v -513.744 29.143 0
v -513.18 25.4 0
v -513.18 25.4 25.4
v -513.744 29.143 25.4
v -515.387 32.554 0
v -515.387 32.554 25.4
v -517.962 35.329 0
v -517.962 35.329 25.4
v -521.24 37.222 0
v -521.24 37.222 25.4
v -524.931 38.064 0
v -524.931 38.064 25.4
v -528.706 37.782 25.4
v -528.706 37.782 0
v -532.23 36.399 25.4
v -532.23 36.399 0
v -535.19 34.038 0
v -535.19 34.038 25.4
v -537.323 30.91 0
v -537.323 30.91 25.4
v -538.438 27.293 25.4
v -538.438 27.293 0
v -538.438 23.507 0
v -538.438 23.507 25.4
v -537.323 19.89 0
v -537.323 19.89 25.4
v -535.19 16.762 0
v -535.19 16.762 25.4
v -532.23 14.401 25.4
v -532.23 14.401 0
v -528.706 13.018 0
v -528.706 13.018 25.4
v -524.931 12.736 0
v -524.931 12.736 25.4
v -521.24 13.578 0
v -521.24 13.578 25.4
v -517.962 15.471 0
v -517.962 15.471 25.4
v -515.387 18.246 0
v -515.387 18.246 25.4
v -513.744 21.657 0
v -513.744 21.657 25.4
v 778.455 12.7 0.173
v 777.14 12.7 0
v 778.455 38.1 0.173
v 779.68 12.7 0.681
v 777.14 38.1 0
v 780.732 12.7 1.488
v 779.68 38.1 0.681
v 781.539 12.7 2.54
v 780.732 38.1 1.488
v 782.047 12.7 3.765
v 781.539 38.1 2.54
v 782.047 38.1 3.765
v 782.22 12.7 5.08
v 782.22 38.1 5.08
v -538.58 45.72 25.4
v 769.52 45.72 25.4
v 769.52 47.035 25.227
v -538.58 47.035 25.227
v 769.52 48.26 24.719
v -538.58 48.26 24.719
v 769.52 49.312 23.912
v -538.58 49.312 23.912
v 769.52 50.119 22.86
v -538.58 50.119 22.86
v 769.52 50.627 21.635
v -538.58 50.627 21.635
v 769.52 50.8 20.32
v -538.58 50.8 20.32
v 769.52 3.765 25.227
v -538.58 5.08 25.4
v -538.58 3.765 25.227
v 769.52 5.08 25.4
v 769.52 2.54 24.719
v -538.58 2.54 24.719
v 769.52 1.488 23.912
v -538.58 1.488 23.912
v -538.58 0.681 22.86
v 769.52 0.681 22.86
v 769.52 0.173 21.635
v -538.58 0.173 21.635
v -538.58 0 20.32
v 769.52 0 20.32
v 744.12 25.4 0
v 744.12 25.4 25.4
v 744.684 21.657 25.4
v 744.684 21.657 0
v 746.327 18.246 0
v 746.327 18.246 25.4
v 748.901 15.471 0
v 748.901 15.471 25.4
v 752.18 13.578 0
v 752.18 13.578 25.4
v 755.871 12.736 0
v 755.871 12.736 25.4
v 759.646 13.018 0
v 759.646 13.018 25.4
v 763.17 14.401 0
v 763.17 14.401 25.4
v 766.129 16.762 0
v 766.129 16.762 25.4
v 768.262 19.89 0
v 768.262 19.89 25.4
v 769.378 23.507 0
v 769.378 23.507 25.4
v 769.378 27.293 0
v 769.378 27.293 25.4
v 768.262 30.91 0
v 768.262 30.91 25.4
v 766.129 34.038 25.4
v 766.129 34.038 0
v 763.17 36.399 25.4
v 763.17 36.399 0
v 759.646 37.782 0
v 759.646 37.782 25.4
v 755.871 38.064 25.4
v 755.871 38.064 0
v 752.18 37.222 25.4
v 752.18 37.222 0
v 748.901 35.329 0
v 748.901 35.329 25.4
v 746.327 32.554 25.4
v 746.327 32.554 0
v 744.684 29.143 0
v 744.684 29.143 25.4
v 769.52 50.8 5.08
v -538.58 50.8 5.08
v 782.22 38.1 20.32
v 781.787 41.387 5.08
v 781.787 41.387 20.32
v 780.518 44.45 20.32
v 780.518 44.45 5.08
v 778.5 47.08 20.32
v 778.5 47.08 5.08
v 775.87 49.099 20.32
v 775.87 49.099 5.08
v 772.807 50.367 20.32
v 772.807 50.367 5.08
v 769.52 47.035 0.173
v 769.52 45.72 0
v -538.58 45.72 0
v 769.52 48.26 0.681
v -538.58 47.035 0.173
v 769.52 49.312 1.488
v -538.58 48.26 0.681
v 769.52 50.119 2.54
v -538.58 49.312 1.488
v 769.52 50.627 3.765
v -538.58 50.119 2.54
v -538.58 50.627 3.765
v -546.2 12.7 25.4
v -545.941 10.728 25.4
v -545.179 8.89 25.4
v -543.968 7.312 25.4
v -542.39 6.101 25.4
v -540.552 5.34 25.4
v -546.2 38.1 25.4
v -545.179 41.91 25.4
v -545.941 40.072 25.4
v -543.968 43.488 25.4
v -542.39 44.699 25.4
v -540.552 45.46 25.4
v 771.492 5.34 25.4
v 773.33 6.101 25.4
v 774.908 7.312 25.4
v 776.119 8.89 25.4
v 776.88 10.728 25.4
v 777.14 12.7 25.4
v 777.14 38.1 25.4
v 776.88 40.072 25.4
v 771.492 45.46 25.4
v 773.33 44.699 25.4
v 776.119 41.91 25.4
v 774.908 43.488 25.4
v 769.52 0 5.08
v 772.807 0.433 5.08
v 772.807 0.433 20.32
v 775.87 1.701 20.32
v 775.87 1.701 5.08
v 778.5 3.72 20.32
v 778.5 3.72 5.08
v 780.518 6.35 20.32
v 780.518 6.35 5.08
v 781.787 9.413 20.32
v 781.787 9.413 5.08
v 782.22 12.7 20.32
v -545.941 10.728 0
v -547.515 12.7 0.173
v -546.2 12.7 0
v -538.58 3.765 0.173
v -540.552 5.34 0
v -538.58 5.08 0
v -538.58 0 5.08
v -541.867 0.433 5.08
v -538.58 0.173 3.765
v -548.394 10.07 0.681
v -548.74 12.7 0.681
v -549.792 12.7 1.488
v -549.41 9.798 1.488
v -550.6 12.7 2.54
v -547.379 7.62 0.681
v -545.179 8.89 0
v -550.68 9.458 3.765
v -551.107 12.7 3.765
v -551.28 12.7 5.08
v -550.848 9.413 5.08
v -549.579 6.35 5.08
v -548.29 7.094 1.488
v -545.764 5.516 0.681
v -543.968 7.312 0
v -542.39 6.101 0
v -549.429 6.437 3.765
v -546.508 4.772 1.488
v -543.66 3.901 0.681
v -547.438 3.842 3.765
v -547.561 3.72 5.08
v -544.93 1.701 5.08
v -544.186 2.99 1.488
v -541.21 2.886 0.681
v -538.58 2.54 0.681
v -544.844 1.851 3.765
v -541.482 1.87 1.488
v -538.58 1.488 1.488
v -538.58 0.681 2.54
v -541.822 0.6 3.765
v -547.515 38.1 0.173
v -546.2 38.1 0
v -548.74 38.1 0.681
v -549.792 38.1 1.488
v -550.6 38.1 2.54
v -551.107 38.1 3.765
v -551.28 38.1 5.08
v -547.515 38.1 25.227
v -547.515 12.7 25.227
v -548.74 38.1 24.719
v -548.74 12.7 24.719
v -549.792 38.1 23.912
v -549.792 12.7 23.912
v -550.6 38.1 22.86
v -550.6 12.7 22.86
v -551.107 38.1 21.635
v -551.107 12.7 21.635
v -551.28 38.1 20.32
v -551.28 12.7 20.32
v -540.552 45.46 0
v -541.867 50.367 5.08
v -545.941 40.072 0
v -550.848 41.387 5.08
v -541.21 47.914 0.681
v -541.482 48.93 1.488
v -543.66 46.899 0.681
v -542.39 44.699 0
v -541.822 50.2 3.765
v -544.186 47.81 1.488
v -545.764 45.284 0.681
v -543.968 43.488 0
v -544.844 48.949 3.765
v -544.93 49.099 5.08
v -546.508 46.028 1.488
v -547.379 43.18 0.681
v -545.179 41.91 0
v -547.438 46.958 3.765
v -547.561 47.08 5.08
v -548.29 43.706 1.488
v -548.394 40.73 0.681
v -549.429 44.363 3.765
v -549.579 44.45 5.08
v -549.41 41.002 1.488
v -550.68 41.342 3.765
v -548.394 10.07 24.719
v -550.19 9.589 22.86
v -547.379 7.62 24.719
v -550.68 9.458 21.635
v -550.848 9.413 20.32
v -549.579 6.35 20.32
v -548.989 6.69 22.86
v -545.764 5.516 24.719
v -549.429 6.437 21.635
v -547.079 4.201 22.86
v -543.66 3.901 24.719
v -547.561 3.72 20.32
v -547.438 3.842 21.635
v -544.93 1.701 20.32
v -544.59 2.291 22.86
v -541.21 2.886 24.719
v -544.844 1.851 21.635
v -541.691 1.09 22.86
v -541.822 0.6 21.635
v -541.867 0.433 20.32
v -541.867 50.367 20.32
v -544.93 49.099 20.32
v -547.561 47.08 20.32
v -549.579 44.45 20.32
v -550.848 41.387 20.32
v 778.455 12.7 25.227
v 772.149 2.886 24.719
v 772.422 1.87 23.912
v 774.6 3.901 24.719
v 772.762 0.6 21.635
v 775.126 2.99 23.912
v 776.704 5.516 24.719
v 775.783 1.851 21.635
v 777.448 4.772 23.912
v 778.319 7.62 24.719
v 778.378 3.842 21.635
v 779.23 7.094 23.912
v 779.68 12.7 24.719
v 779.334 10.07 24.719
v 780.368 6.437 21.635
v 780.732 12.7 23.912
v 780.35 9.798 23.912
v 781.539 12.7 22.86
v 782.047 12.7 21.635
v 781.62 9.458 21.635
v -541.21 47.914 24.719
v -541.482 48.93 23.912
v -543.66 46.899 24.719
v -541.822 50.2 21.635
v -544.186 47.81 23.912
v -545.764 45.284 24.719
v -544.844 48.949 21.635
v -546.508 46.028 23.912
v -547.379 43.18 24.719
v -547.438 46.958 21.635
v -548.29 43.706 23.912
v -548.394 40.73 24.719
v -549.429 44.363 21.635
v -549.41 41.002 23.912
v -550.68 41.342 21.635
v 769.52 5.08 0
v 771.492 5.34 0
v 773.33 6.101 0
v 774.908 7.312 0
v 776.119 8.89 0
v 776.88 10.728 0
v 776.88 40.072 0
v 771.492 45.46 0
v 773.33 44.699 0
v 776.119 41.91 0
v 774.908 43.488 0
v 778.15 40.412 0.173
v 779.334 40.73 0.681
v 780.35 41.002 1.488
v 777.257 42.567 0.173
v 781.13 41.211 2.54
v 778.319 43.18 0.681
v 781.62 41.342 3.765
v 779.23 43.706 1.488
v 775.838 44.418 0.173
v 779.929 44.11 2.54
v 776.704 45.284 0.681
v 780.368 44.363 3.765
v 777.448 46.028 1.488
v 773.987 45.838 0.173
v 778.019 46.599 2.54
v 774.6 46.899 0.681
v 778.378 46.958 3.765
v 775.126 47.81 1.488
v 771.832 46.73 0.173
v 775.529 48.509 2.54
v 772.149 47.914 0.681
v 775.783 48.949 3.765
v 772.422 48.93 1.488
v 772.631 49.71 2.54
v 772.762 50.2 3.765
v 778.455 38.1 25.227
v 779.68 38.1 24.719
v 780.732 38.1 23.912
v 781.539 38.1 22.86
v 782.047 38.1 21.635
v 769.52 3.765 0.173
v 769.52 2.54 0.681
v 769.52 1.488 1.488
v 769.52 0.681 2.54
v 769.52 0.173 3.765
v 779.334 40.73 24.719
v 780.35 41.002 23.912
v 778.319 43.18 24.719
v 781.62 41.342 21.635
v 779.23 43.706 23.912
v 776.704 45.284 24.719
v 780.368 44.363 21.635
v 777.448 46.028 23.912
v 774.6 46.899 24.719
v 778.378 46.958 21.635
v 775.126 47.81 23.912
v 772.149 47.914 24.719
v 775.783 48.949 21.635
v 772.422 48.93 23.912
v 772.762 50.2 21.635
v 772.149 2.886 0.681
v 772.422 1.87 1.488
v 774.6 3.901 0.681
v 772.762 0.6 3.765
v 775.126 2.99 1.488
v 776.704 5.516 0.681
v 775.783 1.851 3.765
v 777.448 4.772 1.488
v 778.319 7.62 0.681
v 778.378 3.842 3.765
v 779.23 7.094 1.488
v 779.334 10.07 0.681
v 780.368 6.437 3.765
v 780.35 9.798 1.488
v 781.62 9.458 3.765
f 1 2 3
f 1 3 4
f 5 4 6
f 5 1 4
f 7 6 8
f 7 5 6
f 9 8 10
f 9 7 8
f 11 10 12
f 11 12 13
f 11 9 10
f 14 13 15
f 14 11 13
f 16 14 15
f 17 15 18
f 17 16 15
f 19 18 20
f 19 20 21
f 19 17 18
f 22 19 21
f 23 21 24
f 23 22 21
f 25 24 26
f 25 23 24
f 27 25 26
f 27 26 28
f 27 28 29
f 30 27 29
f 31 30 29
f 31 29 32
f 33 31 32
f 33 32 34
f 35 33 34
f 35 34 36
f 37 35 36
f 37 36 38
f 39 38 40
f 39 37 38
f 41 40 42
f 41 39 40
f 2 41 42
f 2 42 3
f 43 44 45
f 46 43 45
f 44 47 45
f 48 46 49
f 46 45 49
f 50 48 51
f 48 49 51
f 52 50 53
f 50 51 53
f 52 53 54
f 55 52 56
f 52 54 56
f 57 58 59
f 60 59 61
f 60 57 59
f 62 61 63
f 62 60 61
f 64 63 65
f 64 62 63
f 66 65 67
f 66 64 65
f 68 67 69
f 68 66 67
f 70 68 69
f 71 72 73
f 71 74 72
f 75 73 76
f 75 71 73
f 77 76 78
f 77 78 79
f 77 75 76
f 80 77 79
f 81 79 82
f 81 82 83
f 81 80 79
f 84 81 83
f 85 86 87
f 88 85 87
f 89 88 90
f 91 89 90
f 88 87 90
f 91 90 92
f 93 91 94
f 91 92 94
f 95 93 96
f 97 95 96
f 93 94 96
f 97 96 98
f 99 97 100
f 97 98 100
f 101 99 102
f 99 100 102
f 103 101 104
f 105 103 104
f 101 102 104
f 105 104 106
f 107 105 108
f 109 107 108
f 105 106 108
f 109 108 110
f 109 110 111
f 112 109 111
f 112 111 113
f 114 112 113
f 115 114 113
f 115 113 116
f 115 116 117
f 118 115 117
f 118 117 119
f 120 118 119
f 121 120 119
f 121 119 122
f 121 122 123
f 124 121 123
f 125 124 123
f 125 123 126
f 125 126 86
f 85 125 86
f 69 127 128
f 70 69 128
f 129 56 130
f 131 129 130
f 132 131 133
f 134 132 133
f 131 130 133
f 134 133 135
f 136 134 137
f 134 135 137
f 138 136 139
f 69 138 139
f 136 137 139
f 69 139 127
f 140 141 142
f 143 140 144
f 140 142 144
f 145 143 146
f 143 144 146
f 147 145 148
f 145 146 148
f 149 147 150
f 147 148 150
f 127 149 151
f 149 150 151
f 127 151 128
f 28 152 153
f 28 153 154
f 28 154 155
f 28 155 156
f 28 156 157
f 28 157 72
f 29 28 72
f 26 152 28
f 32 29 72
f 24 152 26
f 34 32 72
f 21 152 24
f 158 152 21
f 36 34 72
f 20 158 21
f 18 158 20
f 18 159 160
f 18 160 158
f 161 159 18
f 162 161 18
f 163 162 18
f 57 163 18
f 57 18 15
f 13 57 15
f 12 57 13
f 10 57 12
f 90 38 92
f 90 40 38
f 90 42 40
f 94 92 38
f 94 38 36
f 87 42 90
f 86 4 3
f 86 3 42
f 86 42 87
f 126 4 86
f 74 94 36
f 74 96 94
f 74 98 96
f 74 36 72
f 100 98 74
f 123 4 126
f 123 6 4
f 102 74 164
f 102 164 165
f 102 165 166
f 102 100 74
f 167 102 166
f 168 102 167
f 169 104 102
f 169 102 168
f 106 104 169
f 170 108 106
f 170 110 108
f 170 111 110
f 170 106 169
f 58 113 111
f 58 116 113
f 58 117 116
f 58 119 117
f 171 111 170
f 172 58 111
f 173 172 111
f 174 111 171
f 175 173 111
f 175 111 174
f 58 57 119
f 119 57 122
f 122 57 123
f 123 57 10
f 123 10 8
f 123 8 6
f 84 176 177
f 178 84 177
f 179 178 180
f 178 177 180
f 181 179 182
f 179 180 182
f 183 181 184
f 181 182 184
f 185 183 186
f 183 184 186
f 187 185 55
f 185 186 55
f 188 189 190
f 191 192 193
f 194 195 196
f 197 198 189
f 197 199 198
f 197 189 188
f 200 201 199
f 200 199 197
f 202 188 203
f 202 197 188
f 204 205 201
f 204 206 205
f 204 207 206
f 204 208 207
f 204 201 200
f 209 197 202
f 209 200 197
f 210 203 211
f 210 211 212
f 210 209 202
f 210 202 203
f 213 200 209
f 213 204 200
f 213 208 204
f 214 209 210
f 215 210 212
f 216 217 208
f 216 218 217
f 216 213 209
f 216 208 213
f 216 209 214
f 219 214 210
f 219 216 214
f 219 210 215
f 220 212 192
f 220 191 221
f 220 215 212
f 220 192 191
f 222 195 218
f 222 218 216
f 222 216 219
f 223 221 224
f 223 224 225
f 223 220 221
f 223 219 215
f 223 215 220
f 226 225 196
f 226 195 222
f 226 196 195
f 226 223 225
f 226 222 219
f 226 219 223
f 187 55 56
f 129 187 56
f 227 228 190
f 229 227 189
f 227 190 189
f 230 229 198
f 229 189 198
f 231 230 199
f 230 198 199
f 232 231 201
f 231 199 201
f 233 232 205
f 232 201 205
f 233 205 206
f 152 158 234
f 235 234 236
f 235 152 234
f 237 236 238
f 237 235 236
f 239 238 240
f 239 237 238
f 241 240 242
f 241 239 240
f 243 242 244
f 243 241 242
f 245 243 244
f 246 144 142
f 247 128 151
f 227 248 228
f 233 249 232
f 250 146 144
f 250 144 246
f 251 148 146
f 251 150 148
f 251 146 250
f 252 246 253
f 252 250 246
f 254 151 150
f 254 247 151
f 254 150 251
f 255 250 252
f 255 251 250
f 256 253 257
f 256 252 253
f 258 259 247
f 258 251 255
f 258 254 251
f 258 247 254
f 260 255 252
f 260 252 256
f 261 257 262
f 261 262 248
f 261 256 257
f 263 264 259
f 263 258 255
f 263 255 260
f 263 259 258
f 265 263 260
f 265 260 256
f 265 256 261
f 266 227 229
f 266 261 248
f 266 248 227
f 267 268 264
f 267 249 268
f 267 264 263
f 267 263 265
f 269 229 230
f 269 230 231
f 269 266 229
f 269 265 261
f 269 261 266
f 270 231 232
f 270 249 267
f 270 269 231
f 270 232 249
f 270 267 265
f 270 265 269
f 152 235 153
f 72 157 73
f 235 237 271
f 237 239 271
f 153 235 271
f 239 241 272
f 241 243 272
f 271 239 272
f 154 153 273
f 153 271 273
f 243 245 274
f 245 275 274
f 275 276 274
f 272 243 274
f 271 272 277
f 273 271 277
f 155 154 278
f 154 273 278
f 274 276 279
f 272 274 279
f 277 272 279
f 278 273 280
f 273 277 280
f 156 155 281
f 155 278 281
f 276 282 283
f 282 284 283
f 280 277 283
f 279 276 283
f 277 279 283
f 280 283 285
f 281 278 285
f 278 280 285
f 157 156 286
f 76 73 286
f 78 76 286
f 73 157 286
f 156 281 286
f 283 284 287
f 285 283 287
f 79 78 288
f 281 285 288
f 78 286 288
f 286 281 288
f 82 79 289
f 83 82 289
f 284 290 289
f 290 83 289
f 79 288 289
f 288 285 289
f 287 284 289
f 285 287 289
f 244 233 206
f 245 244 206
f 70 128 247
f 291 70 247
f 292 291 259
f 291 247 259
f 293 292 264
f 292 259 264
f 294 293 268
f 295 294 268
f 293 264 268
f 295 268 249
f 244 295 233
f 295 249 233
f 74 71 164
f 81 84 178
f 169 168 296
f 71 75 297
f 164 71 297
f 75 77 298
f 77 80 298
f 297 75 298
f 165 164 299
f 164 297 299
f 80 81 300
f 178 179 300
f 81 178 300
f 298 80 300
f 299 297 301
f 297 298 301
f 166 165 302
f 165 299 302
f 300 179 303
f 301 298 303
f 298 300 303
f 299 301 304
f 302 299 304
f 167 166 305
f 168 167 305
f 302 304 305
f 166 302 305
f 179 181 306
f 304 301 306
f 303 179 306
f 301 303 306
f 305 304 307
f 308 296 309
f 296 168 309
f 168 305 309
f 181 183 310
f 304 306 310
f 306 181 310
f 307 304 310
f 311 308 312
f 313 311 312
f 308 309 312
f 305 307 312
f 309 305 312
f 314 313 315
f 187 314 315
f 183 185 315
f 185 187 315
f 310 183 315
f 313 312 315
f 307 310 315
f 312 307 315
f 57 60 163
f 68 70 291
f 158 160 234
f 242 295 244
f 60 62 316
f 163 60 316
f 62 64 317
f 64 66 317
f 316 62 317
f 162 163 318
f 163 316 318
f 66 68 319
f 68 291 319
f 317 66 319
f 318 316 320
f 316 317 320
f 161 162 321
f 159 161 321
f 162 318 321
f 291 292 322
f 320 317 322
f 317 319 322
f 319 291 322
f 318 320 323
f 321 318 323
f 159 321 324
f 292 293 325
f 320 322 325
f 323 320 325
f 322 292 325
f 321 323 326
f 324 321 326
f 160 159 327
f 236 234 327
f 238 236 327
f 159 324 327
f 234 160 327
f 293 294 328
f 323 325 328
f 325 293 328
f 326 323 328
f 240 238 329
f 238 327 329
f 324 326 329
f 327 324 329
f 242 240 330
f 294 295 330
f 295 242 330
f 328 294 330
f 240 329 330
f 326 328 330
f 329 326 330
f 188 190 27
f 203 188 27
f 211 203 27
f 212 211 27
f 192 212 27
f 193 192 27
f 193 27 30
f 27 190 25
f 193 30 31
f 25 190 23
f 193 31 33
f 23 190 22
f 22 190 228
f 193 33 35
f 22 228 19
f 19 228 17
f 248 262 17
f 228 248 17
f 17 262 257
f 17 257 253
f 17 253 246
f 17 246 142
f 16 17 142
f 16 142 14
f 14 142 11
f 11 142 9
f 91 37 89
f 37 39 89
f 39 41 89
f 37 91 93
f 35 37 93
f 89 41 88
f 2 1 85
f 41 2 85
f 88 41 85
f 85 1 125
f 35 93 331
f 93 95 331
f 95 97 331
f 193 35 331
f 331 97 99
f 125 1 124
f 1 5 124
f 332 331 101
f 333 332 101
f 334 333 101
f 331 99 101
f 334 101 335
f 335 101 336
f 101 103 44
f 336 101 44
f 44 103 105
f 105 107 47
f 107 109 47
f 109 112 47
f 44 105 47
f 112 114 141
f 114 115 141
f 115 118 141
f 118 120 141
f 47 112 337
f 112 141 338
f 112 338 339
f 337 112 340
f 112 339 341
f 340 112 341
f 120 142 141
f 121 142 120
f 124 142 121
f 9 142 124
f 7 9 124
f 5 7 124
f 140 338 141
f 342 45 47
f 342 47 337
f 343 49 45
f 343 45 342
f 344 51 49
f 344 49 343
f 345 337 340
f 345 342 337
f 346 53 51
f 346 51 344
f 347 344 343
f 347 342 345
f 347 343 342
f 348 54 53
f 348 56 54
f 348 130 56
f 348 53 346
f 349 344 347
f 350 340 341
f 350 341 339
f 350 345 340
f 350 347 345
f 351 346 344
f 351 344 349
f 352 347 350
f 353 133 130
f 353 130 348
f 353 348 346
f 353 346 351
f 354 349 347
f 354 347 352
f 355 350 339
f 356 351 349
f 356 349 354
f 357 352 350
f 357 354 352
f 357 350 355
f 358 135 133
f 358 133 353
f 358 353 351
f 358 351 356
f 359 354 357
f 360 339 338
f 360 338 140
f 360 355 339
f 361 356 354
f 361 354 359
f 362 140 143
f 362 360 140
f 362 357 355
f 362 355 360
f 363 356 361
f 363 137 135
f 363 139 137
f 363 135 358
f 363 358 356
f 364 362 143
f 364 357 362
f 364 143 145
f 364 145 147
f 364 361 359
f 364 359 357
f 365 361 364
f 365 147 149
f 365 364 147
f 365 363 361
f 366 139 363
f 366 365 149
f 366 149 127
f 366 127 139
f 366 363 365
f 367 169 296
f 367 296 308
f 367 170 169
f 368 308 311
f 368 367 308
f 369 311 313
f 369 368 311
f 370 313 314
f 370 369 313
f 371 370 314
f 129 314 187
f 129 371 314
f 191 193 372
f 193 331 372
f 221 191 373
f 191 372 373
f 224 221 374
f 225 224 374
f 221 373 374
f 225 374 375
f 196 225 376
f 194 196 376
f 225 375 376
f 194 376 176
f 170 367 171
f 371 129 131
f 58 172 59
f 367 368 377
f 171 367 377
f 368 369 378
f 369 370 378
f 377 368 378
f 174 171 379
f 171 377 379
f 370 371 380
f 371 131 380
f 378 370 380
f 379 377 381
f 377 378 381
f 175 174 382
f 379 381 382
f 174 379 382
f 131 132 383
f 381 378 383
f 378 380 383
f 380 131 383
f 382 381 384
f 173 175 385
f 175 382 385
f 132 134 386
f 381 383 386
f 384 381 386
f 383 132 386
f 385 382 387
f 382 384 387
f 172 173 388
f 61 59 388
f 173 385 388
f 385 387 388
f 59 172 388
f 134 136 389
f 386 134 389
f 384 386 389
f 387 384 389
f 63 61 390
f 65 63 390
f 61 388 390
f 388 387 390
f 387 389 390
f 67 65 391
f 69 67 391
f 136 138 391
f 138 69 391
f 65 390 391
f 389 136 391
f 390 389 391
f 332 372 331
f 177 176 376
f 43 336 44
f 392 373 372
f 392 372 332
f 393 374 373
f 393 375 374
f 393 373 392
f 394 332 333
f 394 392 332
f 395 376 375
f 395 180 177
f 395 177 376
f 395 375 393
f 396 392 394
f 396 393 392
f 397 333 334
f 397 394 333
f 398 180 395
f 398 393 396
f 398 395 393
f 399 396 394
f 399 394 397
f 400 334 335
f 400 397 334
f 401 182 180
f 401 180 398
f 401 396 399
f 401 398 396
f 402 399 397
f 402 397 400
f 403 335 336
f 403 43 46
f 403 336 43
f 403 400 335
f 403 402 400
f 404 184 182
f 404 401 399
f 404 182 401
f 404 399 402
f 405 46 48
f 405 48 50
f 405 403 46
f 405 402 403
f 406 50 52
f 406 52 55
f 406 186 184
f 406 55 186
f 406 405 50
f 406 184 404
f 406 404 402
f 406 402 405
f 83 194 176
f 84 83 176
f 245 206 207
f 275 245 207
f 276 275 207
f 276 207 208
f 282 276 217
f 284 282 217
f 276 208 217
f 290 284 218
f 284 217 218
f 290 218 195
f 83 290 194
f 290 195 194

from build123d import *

# Parameters (mm, degrees)
F0_R     = 12.7
F1_DEPTH = 25.4
F3_D     = 25.4
F4_R     = 5.08


with BuildPart() as f1:
    # F0 (on Top) → F1 (new body)
    with BuildSketch(Plane.XY):
        with BuildLine():
            Line((769.519733, 50.8), (-538.580267, 50.8))
            ThreePointArc((-538.580267, 50.8), (-547.560523, 47.080256), (-551.280267, 38.1))
            Line((-551.280267, 38.1), (-551.280267, 12.7))
            ThreePointArc((-551.280267, 12.7), (-547.560523, 3.719744), (-538.580267, 0))
            Line((-538.580267, 0), (769.519733, 0))
            ThreePointArc((769.519733, 0), (778.499989, 3.719744), (782.219733, 12.7))
            Line((782.219733, 12.7), (782.219733, 38.1))
            ThreePointArc((782.219733, 38.1), (778.499989, 47.080256), (769.519733, 50.8))
        make_face()
        with Locations((-525.880267, 25.4)):
            Circle(F0_R, mode=Mode.SUBTRACT)
    extrude(amount=F1_DEPTH)

    # F3 (through all)
    with Locations(Plane(origin=(0, 0, 0), x_dir=(1, 0, 0), z_dir=(0, 0, -1))):
        with Locations((756.819733, -25.4)):
            Hole(F3_D / 2)

    # F4
    f4_edges = [f1.edges().sort_by_distance(p)[0] for p in [
        (115.469733, 0, 0),
        (-551.280267, 25.4, 0),
        (115.469733, 50.8, 0),
        (782.219733, 25.4, 0),
        (115.469733, 0, 25.4),
        (782.219733, 25.4, 25.4),
        (115.469733, 50.8, 25.4),
        (-551.280267, 25.4, 25.4),
    ]]
    fillet(f4_edges, radius=F4_R)


solid = f1.part
